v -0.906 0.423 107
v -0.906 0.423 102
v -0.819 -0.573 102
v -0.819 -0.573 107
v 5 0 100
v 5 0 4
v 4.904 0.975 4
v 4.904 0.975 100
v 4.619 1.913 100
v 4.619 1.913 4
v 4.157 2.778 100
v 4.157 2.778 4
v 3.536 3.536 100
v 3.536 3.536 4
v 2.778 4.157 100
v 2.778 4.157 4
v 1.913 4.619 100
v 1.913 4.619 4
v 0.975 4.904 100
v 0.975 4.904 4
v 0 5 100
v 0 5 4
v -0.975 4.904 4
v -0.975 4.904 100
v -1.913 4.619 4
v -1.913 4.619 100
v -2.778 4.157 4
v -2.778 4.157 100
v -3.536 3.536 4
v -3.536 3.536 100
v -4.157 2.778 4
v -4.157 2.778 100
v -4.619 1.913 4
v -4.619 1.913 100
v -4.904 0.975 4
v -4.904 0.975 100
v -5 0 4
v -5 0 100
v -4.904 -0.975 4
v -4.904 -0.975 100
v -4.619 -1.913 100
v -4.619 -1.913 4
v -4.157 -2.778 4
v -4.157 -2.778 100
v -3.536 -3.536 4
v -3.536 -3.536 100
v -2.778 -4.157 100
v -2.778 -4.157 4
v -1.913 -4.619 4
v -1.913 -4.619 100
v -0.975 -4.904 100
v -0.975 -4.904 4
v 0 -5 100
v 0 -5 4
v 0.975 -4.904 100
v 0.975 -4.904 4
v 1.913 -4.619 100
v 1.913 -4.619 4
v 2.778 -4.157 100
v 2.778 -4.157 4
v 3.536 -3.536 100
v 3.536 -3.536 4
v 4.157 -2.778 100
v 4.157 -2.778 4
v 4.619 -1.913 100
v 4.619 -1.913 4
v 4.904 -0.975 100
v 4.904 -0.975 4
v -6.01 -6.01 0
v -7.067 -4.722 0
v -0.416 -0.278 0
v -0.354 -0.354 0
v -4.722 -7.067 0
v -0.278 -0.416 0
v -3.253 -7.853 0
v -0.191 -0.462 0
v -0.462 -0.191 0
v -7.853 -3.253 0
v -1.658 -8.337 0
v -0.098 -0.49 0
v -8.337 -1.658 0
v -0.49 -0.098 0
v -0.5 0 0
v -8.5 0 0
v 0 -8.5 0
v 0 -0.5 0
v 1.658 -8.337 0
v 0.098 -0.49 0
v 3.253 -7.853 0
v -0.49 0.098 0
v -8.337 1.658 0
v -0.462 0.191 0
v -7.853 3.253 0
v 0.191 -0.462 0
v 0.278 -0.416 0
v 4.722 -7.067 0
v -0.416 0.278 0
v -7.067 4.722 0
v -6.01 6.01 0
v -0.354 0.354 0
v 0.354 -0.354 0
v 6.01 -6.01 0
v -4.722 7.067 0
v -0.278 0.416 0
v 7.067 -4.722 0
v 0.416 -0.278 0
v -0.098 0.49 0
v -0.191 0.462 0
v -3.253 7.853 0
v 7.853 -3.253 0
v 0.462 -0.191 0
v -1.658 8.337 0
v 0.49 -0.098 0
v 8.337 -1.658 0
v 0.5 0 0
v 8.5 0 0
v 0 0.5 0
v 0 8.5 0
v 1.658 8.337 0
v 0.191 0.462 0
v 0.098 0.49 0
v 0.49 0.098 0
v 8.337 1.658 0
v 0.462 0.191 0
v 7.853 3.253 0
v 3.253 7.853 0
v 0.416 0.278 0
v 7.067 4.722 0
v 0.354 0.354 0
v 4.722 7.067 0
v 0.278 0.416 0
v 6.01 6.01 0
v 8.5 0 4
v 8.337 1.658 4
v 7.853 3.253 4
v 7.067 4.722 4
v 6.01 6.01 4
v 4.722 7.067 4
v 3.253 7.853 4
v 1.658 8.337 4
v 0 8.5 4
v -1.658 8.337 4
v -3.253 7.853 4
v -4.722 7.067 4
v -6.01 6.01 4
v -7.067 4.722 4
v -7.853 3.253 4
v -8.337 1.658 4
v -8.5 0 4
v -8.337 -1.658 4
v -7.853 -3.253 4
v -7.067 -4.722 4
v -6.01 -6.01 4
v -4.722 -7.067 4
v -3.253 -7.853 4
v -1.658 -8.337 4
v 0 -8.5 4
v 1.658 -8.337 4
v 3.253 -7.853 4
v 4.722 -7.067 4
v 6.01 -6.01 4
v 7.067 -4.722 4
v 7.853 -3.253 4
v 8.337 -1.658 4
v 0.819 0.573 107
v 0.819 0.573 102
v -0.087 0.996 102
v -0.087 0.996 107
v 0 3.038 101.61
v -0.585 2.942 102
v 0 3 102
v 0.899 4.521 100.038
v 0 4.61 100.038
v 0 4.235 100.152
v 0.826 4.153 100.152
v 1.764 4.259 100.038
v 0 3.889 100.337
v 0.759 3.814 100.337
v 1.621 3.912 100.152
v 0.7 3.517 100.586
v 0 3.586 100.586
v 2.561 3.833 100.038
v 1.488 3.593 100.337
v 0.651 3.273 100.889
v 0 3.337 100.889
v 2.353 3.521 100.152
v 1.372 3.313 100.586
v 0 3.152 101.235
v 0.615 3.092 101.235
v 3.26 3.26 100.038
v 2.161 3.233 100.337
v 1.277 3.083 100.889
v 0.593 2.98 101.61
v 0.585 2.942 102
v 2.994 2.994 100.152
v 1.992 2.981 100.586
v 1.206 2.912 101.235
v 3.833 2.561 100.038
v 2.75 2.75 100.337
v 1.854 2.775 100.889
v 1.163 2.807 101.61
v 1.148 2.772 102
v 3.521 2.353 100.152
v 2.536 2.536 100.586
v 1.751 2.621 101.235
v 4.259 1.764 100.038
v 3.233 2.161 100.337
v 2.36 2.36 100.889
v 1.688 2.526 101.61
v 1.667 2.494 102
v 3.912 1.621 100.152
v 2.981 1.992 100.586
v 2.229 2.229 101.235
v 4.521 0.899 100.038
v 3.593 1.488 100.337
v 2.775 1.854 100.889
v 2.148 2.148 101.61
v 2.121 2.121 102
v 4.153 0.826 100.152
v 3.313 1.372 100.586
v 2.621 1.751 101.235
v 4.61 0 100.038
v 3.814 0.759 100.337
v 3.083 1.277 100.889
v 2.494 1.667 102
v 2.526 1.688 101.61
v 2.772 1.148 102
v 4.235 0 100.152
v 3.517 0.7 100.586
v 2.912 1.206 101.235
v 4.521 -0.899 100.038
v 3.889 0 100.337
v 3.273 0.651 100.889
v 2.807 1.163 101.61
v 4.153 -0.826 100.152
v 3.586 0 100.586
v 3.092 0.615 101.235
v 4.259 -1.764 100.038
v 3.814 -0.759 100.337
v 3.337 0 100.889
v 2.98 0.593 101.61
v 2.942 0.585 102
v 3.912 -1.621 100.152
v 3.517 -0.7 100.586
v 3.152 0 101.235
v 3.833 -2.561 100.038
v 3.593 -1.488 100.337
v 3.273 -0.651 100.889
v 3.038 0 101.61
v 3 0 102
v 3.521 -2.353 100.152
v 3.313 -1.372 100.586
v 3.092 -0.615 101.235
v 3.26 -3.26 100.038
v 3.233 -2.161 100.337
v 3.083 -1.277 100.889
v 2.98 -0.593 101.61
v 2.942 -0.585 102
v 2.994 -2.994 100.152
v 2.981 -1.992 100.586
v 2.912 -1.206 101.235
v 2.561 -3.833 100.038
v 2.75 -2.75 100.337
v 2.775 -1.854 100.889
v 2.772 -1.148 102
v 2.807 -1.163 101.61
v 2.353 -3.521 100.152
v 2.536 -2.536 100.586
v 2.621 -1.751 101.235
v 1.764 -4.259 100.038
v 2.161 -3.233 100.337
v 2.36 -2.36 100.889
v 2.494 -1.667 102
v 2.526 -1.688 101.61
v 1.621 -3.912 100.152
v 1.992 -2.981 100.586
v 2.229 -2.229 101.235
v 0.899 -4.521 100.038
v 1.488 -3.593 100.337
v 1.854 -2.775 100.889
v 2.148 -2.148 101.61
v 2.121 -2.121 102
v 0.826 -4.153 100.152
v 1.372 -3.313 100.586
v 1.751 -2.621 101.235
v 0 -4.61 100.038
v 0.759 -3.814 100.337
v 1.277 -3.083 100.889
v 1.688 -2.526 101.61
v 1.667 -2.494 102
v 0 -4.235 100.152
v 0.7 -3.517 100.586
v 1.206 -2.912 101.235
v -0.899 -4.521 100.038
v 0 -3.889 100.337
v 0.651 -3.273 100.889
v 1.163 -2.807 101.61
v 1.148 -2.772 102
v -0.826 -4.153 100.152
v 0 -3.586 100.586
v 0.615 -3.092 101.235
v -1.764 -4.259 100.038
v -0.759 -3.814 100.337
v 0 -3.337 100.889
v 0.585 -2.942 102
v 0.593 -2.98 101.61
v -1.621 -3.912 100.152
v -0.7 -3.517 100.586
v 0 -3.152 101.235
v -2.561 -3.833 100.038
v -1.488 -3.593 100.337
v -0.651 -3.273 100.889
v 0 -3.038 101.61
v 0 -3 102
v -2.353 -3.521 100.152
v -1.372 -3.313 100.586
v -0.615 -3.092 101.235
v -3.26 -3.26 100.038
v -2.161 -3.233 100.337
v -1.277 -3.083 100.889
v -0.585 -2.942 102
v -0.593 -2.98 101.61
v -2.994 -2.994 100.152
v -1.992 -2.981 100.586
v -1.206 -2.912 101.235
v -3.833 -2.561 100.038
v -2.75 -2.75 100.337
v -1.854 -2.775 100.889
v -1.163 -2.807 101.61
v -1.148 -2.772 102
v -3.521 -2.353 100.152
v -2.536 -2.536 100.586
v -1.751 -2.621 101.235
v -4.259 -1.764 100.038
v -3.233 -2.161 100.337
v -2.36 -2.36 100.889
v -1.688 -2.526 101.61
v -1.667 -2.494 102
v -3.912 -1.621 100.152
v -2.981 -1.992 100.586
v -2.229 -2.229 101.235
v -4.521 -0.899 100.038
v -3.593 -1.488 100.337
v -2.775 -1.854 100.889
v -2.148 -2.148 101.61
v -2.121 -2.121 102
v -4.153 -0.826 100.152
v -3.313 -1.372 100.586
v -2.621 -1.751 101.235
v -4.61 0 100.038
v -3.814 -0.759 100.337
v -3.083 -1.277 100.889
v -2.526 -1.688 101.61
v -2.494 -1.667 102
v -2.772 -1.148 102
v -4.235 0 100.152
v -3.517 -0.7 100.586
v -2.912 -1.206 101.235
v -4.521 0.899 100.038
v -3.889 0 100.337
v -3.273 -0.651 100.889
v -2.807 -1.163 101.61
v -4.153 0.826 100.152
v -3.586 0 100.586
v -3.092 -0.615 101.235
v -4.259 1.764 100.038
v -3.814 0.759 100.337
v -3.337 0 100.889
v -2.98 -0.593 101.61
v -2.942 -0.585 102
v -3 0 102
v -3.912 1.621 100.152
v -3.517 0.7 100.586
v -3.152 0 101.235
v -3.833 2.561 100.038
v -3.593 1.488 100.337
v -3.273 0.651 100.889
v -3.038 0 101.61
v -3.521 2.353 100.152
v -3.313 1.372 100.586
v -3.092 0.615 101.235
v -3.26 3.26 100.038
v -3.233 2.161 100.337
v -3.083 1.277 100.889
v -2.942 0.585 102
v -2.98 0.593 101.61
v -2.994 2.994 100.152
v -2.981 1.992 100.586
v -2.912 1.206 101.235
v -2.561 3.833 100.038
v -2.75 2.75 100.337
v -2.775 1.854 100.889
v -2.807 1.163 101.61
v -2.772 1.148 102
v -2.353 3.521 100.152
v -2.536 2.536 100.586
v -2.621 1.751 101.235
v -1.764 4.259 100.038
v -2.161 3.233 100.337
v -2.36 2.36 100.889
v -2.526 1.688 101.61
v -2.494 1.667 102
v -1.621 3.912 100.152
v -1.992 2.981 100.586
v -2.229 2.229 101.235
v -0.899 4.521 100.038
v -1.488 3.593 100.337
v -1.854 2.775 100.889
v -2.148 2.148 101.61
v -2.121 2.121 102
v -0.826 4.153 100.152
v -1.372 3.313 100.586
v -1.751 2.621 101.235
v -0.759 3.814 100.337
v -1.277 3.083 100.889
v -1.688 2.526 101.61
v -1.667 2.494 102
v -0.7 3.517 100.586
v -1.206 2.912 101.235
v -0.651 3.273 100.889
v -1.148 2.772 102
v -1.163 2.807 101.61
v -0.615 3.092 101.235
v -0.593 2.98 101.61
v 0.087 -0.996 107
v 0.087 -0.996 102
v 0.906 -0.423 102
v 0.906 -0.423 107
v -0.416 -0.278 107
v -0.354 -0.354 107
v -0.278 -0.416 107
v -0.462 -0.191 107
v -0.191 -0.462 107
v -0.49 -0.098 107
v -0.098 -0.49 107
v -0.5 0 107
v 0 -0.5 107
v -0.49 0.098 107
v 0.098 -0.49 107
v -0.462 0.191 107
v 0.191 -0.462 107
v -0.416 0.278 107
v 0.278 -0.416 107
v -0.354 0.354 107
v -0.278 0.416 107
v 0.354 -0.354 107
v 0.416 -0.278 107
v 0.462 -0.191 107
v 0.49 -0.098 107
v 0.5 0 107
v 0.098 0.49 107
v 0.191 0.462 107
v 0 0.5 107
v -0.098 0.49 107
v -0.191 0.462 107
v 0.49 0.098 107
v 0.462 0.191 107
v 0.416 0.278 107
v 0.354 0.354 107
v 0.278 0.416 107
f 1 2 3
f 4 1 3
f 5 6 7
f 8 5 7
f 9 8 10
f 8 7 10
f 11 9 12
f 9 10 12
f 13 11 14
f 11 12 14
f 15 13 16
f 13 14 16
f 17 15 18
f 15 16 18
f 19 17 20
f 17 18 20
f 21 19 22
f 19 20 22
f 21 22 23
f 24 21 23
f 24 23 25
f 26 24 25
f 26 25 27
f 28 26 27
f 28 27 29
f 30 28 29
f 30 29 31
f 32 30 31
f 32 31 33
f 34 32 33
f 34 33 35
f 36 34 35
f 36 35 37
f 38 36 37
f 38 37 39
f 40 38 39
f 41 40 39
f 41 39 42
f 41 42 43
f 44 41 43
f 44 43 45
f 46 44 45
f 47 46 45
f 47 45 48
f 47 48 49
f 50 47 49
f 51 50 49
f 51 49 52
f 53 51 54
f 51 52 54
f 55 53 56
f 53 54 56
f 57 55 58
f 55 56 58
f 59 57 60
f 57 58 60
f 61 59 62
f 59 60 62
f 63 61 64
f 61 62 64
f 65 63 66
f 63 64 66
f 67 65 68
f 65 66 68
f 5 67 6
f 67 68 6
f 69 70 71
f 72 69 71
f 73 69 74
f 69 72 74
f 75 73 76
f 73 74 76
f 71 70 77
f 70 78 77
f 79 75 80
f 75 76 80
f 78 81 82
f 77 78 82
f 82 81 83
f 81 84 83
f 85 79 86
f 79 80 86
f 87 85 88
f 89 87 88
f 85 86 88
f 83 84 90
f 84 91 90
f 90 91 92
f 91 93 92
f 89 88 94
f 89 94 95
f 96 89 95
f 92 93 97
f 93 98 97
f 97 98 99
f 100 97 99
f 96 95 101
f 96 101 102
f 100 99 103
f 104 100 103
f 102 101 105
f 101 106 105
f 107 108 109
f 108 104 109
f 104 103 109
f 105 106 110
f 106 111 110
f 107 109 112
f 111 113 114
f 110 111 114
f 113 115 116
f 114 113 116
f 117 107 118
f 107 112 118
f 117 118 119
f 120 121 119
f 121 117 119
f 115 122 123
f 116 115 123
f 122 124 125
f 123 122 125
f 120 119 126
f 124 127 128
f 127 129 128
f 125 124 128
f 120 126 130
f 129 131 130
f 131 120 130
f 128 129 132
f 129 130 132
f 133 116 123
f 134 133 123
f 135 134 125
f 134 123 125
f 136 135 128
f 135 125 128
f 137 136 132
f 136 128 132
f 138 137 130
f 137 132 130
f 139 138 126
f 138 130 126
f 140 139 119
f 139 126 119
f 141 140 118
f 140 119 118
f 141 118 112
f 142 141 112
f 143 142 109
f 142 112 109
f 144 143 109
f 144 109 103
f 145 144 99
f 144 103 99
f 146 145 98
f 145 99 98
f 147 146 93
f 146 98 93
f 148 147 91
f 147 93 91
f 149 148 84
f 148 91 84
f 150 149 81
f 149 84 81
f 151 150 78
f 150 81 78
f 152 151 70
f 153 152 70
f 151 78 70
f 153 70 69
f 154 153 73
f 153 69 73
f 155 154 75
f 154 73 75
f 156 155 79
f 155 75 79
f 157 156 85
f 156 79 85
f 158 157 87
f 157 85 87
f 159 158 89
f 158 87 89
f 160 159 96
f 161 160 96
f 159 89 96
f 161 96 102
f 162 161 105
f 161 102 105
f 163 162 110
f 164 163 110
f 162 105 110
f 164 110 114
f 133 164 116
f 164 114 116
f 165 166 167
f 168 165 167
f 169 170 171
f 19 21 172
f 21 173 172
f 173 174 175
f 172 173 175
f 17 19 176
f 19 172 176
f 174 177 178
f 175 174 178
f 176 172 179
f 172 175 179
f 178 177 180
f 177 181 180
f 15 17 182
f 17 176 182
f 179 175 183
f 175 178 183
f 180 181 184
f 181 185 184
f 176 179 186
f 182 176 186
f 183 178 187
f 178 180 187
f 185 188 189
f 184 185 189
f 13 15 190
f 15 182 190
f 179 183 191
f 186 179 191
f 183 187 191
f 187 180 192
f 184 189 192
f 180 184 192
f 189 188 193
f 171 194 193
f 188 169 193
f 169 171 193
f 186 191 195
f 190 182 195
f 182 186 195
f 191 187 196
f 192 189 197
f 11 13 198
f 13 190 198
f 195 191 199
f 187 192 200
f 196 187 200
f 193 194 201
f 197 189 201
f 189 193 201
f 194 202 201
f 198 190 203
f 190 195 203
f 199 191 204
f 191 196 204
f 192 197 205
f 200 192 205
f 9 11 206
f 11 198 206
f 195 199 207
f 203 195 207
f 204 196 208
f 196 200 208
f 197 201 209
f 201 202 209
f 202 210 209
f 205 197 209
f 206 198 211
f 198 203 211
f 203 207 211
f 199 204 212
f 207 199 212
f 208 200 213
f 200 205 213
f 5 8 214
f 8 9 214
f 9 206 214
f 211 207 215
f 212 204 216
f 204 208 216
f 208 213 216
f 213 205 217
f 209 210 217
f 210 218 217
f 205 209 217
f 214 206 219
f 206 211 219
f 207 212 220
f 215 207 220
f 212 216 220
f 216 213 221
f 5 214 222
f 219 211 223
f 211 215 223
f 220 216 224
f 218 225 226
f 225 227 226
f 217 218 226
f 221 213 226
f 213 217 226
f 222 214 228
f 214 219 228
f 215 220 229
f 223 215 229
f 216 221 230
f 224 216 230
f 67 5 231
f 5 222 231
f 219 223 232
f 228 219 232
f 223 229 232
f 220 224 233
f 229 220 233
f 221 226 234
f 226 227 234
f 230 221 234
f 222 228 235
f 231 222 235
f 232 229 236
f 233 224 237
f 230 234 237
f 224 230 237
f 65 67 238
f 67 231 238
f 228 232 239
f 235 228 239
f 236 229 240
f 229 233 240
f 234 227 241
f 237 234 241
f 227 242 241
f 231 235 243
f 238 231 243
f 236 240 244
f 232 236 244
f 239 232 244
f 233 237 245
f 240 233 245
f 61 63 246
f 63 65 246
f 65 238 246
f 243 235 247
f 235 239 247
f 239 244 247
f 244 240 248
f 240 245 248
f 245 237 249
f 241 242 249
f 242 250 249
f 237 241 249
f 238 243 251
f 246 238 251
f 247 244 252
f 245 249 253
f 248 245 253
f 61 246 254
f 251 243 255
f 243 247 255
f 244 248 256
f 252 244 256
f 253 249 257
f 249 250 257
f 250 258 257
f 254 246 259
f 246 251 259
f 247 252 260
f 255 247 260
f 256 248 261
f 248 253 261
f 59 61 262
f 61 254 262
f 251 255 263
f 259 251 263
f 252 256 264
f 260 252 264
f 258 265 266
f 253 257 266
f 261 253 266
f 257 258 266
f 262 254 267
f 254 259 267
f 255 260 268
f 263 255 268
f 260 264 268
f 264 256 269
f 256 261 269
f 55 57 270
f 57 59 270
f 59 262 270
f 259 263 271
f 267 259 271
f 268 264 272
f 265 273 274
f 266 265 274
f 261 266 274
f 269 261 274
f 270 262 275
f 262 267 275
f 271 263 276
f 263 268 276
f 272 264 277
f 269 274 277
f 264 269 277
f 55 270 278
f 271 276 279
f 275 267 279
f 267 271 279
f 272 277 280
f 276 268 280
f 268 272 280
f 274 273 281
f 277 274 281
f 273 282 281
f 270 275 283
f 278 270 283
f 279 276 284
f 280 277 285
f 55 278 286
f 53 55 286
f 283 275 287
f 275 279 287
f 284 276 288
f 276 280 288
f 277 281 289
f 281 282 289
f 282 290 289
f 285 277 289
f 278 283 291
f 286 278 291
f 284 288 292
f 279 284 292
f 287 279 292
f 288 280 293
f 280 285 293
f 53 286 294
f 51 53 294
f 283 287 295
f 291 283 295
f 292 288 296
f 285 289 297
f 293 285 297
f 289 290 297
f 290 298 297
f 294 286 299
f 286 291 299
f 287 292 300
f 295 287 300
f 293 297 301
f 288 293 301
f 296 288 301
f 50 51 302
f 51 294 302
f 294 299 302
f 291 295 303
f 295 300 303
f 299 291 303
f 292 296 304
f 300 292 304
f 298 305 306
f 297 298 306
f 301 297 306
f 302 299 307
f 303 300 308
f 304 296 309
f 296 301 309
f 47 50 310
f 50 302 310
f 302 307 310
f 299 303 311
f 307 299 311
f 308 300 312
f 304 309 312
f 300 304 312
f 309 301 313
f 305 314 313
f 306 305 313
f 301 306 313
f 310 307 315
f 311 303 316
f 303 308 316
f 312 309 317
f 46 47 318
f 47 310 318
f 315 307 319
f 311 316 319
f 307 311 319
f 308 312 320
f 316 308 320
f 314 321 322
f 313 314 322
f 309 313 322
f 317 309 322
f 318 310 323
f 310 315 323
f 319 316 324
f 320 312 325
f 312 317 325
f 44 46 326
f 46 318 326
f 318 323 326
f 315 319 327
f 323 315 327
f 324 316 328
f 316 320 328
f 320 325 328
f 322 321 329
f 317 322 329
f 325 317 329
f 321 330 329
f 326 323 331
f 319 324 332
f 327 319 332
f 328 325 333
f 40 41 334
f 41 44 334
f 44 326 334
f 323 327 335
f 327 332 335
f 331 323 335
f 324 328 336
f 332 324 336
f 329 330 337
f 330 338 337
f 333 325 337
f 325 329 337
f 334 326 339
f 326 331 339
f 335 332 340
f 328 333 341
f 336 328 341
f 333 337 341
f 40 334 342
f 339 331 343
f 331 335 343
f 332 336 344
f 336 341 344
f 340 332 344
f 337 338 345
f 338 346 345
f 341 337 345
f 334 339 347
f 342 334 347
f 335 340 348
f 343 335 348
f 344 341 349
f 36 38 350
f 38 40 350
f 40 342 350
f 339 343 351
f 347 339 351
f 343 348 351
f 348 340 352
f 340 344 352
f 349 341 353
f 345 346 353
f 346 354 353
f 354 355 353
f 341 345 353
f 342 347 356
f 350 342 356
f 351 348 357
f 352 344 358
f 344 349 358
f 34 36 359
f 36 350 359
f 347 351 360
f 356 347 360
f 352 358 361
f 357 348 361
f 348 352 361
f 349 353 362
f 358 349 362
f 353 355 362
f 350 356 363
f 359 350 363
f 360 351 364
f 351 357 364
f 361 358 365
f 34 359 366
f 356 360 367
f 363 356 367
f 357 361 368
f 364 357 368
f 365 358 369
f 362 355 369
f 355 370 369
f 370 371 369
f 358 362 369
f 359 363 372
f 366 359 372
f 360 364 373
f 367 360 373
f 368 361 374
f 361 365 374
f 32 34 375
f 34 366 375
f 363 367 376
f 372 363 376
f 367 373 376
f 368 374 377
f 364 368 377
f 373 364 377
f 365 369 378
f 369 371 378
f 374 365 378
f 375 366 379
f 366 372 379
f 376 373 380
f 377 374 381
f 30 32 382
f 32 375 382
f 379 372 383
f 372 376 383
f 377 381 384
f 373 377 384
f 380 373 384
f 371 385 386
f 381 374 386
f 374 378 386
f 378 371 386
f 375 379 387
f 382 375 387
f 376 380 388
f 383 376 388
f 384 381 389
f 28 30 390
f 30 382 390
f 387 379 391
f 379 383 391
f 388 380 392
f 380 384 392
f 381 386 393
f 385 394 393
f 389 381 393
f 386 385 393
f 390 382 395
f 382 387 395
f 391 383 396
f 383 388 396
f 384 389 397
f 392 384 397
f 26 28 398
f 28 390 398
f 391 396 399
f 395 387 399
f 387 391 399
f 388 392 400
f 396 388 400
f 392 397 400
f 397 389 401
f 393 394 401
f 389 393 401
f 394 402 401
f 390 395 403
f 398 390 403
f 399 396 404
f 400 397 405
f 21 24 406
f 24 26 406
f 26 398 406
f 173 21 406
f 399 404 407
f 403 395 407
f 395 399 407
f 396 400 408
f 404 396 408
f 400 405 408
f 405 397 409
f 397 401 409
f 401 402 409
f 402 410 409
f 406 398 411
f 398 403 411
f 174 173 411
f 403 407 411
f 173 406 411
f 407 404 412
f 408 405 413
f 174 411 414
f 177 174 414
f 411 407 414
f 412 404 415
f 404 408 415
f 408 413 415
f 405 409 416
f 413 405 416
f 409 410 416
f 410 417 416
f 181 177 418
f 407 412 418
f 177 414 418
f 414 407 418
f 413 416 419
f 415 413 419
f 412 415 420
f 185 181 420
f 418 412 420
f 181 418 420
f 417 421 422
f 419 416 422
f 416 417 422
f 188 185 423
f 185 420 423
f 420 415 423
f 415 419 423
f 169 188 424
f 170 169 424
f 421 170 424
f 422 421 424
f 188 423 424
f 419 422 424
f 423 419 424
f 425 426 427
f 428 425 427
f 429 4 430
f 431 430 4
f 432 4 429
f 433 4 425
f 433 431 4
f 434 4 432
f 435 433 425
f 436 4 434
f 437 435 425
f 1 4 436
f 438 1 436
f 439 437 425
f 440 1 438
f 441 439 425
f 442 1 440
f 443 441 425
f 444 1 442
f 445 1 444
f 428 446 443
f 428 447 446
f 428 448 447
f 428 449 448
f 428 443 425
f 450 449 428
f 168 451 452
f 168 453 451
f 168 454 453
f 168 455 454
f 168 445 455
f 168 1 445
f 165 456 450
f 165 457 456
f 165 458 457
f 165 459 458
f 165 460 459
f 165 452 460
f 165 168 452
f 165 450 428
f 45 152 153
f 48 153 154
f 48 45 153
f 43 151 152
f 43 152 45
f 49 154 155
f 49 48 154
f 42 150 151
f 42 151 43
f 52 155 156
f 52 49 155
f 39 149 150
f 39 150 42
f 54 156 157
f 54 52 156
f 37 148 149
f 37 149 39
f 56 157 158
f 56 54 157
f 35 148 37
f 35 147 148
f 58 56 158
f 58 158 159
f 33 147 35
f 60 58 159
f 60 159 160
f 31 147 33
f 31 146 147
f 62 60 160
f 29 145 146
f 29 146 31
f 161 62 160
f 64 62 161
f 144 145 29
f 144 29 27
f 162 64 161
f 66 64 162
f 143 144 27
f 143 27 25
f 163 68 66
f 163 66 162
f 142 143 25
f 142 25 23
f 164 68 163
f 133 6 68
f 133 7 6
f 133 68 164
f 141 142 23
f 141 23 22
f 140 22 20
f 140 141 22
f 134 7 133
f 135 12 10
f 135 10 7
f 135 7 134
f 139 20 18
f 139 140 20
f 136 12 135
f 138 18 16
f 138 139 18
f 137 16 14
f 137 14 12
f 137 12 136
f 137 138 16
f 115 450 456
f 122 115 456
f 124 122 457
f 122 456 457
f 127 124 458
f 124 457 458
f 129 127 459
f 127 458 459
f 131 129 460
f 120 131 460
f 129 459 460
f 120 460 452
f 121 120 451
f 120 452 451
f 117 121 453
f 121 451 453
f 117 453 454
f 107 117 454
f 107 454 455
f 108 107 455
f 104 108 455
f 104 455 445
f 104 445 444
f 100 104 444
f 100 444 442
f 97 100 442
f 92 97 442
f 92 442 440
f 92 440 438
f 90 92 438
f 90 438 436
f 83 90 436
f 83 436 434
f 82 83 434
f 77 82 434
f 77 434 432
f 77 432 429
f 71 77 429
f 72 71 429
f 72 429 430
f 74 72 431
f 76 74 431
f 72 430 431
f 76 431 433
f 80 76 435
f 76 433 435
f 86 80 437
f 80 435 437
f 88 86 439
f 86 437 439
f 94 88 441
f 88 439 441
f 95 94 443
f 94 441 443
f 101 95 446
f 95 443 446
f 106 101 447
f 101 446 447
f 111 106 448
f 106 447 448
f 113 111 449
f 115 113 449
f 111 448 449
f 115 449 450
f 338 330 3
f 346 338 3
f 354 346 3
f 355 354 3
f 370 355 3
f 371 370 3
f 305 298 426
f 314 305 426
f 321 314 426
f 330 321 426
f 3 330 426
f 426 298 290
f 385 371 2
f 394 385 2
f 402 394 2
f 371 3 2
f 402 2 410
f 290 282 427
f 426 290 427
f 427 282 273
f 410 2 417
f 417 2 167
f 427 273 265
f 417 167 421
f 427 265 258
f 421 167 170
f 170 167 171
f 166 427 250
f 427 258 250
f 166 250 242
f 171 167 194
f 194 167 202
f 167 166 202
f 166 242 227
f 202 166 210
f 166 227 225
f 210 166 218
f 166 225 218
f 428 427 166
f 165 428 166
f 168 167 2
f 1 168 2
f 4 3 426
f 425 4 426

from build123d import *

# Parameters (mm, degrees)
F0_R     = 8.5
F1_DEPTH = 4
F2_R     = 5
F3_DEPTH = 100
F7_DEPTH = 5
F8_R     = 0.5
F9_DEPTH = 110.1


with BuildPart() as f1:
    # F0 (on Top) → F1 (new body)
    with BuildSketch(Plane.XY):
        Circle(F0_R)
    extrude(amount=F1_DEPTH)

    # F2 (on Top) → F3 (join)
    with BuildSketch(Plane.XY):
        Circle(F2_R)
    extrude(amount=F3_DEPTH)

    # F4 (on Right) → F5 (revolve)
    with BuildSketch(Plane.YZ):
        with BuildLine():
            Line((3, 102), (0, 102))
            Line((0, 102), (0, 100))
            Line((0, 100), (5, 100))
            ThreePointArc((5, 100), (3.585786, 100.585786), (3, 102))
        make_face()
    revolve(axis=Axis((0, 0, 101), (0, 0, -1)))

    # F6 (on face) → F7 (join)
    with BuildSketch(Plane.XY.offset(102)):
        Polygon((0.087017, -0.996207), (0.906249, -0.422744), (0.819232, 0.573463), (-0.087017, 0.996207), (-0.906249, 0.422744), (-0.819232, -0.573463), align=None)
    extrude(amount=F7_DEPTH)

    # F8 (on face) → F9 (cut)
    with BuildSketch(Plane.XY.offset(107)):
        Circle(F8_R)
    extrude(amount=-F9_DEPTH, mode=Mode.SUBTRACT)


solid = f1.part
